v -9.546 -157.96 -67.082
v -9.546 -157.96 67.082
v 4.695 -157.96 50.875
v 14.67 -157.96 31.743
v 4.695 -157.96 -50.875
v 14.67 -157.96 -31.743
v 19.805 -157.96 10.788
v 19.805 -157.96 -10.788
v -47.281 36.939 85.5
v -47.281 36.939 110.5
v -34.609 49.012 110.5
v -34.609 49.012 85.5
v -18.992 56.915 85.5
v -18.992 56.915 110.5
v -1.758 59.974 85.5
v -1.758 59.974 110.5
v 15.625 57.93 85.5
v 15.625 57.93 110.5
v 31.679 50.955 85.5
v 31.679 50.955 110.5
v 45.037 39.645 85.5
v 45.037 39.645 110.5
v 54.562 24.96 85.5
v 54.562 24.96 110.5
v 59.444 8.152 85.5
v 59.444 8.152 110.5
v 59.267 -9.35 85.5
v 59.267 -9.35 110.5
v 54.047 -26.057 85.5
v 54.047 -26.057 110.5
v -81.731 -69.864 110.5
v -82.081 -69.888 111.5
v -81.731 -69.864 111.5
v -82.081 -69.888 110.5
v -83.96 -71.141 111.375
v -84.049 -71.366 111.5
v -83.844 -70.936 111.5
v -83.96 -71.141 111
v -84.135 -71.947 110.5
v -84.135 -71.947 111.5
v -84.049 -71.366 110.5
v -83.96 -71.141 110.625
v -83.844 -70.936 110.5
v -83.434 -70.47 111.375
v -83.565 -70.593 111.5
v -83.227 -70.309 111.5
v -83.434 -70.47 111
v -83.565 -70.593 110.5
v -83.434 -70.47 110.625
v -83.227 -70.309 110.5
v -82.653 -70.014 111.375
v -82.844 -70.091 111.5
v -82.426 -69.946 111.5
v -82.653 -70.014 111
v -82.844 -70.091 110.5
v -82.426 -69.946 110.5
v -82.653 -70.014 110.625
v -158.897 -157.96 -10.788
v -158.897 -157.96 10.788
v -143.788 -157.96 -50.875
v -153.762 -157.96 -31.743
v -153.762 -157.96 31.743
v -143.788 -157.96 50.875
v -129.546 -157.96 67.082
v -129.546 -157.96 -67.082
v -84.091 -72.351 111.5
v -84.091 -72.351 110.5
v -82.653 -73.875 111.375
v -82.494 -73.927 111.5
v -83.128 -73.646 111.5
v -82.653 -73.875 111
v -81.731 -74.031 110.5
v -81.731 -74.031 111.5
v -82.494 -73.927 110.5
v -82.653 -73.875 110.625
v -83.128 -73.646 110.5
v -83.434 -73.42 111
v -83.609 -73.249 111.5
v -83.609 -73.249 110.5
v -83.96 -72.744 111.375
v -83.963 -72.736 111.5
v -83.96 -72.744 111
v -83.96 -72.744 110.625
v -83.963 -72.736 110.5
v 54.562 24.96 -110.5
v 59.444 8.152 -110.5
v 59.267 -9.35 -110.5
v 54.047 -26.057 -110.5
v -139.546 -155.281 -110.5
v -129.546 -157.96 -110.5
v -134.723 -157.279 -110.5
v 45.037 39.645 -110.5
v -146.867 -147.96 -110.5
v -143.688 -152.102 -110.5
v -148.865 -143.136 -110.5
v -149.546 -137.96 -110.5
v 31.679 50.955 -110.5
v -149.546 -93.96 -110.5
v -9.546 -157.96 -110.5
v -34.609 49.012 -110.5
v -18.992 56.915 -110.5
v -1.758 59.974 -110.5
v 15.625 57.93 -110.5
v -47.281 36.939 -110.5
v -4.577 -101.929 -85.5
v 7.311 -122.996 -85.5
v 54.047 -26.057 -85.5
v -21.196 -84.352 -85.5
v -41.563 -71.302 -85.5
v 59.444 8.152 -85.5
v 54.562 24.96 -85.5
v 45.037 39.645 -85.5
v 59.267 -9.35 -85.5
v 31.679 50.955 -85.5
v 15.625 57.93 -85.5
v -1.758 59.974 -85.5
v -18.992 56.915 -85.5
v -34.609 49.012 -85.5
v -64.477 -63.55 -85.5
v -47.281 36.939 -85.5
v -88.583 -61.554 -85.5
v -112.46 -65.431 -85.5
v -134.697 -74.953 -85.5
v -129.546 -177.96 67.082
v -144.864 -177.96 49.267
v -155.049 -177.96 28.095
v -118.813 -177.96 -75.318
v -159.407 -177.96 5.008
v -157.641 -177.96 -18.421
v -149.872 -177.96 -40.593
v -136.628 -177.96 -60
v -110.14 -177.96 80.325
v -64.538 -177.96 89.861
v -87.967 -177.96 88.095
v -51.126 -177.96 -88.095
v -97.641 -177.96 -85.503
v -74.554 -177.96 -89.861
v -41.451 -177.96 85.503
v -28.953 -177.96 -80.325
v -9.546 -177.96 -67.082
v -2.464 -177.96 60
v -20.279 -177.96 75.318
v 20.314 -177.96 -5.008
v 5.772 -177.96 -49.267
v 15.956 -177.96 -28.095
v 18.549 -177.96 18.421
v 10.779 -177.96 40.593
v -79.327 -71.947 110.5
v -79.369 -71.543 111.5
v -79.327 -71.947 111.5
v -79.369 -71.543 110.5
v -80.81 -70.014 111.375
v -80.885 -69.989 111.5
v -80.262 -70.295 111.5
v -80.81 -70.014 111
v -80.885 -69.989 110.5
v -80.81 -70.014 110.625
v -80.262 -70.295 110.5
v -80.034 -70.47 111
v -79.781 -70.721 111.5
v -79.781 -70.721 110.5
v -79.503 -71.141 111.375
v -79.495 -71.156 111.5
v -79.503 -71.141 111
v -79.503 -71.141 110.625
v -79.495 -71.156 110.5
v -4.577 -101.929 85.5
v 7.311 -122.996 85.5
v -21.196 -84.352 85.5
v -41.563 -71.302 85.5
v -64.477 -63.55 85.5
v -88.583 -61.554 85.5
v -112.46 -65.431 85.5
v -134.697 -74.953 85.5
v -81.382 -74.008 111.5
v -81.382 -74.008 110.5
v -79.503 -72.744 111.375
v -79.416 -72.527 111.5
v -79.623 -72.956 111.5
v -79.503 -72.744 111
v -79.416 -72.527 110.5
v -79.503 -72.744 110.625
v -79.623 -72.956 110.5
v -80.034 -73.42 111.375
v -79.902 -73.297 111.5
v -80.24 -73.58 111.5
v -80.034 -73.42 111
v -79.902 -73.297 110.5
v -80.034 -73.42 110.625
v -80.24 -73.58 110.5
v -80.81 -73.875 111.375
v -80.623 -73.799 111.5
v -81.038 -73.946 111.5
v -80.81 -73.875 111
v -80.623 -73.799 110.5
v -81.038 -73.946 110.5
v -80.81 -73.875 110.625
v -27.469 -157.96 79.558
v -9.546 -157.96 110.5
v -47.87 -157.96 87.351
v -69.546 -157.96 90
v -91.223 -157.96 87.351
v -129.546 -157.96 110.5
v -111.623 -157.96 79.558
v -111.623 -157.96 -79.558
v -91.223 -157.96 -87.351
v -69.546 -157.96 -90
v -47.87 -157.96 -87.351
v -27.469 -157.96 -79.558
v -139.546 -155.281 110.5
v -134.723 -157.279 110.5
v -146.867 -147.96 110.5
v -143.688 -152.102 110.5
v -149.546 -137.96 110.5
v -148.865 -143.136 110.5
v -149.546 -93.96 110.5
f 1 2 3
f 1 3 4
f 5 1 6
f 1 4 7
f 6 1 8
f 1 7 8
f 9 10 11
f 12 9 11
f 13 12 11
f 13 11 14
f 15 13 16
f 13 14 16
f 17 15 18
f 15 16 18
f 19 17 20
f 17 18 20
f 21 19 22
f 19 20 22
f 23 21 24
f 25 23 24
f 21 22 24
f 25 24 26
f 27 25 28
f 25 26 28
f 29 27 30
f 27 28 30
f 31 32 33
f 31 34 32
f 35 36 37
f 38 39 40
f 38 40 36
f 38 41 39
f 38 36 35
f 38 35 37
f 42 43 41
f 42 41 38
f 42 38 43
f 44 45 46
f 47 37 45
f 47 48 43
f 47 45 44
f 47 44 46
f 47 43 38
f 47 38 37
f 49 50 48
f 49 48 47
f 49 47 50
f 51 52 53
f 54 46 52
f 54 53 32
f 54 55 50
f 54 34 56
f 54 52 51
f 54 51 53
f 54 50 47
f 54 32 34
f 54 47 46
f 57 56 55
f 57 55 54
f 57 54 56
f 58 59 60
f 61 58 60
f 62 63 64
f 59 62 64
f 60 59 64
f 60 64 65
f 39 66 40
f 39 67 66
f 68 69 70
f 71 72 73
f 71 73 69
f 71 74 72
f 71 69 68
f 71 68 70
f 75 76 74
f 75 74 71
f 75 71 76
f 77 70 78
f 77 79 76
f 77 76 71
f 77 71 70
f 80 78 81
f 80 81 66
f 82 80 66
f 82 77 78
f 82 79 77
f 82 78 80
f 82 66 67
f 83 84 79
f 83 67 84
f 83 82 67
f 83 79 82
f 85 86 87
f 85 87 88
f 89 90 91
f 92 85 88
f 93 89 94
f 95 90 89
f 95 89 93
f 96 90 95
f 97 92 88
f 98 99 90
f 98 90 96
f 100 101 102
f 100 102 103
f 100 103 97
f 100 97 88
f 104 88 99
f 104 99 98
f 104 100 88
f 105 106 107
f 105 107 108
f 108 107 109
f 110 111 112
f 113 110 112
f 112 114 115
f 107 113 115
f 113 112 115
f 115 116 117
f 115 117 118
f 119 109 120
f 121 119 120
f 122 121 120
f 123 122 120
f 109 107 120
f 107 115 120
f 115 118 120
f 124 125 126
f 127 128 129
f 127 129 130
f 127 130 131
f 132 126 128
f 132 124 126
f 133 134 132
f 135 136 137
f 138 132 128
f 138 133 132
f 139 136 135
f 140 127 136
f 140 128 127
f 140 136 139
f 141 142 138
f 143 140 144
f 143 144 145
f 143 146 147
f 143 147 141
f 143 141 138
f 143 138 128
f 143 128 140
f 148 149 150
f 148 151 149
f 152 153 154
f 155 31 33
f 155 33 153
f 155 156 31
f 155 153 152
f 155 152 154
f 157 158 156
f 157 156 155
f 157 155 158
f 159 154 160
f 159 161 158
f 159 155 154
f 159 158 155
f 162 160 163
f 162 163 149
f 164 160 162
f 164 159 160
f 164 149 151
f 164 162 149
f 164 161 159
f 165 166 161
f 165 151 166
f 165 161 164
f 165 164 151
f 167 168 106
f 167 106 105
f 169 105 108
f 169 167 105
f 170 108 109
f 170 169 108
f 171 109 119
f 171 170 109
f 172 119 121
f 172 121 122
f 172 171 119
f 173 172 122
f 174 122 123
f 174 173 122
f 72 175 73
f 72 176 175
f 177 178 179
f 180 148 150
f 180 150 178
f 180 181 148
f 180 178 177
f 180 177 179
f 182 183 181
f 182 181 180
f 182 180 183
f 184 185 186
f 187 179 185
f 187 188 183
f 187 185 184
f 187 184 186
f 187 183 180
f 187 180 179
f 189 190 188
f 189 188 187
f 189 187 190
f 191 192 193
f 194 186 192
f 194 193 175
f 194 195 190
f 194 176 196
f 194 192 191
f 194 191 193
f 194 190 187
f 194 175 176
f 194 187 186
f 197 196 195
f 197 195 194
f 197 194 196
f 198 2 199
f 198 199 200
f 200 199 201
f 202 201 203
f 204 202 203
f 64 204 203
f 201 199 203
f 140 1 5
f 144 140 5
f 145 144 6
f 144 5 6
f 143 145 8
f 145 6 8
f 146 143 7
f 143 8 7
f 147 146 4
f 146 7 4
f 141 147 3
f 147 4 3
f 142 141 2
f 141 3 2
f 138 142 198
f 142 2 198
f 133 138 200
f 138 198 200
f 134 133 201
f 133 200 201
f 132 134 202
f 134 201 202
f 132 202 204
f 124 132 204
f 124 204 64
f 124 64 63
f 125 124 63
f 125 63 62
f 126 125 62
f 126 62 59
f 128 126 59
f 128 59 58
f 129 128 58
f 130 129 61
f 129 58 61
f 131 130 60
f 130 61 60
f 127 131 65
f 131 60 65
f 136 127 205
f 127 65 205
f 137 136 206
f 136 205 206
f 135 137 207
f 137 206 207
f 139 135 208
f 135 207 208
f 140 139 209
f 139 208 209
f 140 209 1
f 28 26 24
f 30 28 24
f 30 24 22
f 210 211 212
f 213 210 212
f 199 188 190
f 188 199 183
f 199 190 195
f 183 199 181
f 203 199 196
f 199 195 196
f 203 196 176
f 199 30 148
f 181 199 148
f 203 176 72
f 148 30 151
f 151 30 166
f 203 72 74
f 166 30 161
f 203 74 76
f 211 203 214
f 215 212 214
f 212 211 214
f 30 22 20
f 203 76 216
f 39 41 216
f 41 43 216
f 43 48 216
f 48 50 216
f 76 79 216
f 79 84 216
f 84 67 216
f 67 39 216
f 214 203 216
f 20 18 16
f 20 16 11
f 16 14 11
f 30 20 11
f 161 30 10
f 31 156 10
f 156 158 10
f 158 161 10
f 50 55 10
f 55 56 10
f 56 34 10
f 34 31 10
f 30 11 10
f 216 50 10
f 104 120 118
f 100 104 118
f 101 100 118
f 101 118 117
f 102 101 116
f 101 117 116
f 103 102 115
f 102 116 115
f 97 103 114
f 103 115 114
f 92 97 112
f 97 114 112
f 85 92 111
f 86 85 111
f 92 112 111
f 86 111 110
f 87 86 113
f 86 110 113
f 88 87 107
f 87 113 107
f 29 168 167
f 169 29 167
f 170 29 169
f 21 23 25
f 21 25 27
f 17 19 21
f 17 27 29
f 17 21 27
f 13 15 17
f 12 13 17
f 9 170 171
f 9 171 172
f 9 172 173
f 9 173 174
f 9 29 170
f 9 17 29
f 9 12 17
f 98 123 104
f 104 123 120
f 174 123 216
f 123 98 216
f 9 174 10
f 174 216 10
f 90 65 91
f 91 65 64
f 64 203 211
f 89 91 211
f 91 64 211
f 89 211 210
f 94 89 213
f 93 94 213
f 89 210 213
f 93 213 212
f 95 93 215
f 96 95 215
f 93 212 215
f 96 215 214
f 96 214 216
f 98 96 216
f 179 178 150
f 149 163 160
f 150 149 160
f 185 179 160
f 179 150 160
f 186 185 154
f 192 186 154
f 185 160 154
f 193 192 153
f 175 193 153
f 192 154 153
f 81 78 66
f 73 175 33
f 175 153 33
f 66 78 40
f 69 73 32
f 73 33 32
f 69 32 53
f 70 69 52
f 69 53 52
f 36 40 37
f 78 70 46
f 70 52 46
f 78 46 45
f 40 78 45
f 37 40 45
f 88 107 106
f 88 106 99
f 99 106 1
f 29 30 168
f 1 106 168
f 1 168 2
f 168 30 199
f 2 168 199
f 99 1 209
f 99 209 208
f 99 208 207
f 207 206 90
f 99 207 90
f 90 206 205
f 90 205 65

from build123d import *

# Parameters (mm, degrees)
BOSS_EXTRUDE1_DEPTH      = 110.5
BOSS_EXTRUDE1_DEPTH_BACK = 110.5
CUT_EXTRUDE1_DEPTH       = 85.5
CUT_EXTRUDE1_DEPTH_BACK  = 85.5
SKETCH3_R                = 90
BOSS_EXTRUDE2_DEPTH      = 20
BODY_MOVE_COPY1_ANGLE    = 90
BOSS_EXTRUDE3_DEPTH      = 1


with BuildPart() as part:
    # Sketch1 → Boss-Extrude1 (new, two sides: drawn at the far end of the back side and taken through both)
    with BuildSketch(Plane(origin=(0, 0, 0), x_dir=(0, 0, -1), z_dir=(1, 0, 0)).offset(-BOSS_EXTRUDE1_DEPTH_BACK)):
        with BuildLine():
            Line((-64.292863754, -51.10932545), (55.707136246, -51.10932545))
            ThreePointArc((55.707136246, -51.10932545), (69.84927187, -45.251461074), (75.707136246, -31.10932545))
            Line((75.707136246, -31.10932545), (75.707136246, 12.89067455))
            Line((75.707136246, 12.89067455), (-26.557571018, 143.789344322))
            ThreePointArc((-26.557571018, 143.789344322), (-105.517875867, 157.806043193), (-127.885671837, 80.793840961))
            Line((-127.885671837, 80.793840961), (-64.292863754, -51.10932545))
        make_face()
    extrude(amount=BOSS_EXTRUDE1_DEPTH + BOSS_EXTRUDE1_DEPTH_BACK)

    # Sketch2 → Cut-Extrude1 (cut, two sides: drawn at the far end of the back side and taken through both)
    with BuildSketch(Plane(origin=(0, 0, 0), x_dir=(0, 0, -1), z_dir=(1, 0, 0)).offset(-CUT_EXTRUDE1_DEPTH_BACK)):
        with BuildLine():
            Line((-127.885671837, 80.793840961), (-81.149808611, -16.144925076))
            ThreePointArc((-81.149808611, -16.144925076), (-21.055510127, 40.123069763), (60.857619094, 31.898033921))
            Line((60.857619094, 31.898033921), (-26.557571018, 143.789344322))
            ThreePointArc((-26.557571018, 143.789344322), (-105.517875867, 157.806043193), (-127.885671837, 80.793840961))
        make_face()
    extrude(amount=CUT_EXTRUDE1_DEPTH + CUT_EXTRUDE1_DEPTH_BACK, mode=Mode.SUBTRACT)

    # Sketch3 → Boss-Extrude2 (add)
    with BuildSketch(Plane.XZ.offset(51.10932545)):
        with Locations((0, 4.292863754)):
            Circle(SKETCH3_R)
    extrude(amount=BOSS_EXTRUDE2_DEPTH)


with BuildPart() as part_1:
    # Body-Move/Copy1: moved
    add(part.part.rotate(Axis((0, 0, 0), (0, 1, 0)), BODY_MOVE_COPY1_ANGLE))

    # Sketch4 → Boss-Extrude3 (add)
    with BuildSketch(Plane.XY.offset(110.5)):
        with BuildLine():
            add(Edge.make_bspline(
                [(-7.892298412, 36.986704623), (-7.731424988, 36.97864928), (-7.419070809, 36.963008908), (-6.967618916, 36.851284273), (-6.555873051, 36.656661621), (-6.188786467, 36.392582396), (-5.87896222, 36.078180341), (-5.65016273, 35.71921506), (-5.513989502, 35.321796415), (-5.497073858, 35.044635312), (-5.488452259, 34.90337129)],
                knots=[0, 0, 0, 0, 1.093025379, 2.122233962, 3.13739964, 4.170167025, 5.181202767, 6.119320369, 7.041451468, 8, 8, 8, 8], degree=3))
            add(Edge.make_bspline(
                [(-5.488452259, 34.90337129), (-5.497406625, 34.765509384), (-5.515182791, 34.491826572), (-5.649926135, 34.097337276), (-5.880505469, 33.738380755), (-6.18693796, 33.41913881), (-6.555993835, 33.154861618), (-6.968359777, 32.961898769), (-7.418241254, 32.842085164), (-7.731283731, 32.827526345), (-7.892298412, 32.820037956)],
                knots=[0, 0, 0, 0, 0.937343707, 1.860810353, 2.800286657, 3.820978539, 4.855241709, 5.871877678, 6.905391563, 8, 8, 8, 8], degree=3))
            add(Edge.make_bspline(
                [(-7.892298412, 32.820037956), (-8.053339268, 32.827461421), (-8.366432635, 32.841894016), (-8.817422774, 32.963004322), (-9.232383344, 33.153609982), (-9.602694964, 33.417641247), (-9.90389839, 33.740107583), (-10.134877578, 34.097146255), (-10.26936178, 34.491874817), (-10.287172696, 34.765525545), (-10.296144566, 34.90337129)],
                knots=[0, 0, 0, 0, 1.094267983, 2.127460414, 3.154075327, 4.188016812, 5.200584313, 6.139768412, 7.062947834, 8, 8, 8, 8], degree=3))
            add(Edge.make_bspline(
                [(-10.296144566, 34.90337129), (-10.287504989, 35.044618426), (-10.27055407, 35.321746398), (-10.134639162, 35.71940767), (-9.905453118, 36.07643862), (-9.600833421, 36.394095039), (-9.23250791, 36.657911588), (-8.818168555, 36.850199857), (-8.365603653, 36.963201799), (-8.053198229, 36.978714853), (-7.892298412, 36.986704623)],
                knots=[0, 0, 0, 0, 0.95825844, 1.880110469, 2.817944164, 3.820814674, 4.853269506, 5.878408302, 6.90730541, 8, 8, 8, 8], degree=3))
        make_face()
    extrude(amount=BOSS_EXTRUDE3_DEPTH)


with BuildPart() as part_2:
    # Body-Move/Copy2: moved
    add(part_1.part.moved(Location((-73.839012149, -106.85067455, 0))))


solid = part_2.part
